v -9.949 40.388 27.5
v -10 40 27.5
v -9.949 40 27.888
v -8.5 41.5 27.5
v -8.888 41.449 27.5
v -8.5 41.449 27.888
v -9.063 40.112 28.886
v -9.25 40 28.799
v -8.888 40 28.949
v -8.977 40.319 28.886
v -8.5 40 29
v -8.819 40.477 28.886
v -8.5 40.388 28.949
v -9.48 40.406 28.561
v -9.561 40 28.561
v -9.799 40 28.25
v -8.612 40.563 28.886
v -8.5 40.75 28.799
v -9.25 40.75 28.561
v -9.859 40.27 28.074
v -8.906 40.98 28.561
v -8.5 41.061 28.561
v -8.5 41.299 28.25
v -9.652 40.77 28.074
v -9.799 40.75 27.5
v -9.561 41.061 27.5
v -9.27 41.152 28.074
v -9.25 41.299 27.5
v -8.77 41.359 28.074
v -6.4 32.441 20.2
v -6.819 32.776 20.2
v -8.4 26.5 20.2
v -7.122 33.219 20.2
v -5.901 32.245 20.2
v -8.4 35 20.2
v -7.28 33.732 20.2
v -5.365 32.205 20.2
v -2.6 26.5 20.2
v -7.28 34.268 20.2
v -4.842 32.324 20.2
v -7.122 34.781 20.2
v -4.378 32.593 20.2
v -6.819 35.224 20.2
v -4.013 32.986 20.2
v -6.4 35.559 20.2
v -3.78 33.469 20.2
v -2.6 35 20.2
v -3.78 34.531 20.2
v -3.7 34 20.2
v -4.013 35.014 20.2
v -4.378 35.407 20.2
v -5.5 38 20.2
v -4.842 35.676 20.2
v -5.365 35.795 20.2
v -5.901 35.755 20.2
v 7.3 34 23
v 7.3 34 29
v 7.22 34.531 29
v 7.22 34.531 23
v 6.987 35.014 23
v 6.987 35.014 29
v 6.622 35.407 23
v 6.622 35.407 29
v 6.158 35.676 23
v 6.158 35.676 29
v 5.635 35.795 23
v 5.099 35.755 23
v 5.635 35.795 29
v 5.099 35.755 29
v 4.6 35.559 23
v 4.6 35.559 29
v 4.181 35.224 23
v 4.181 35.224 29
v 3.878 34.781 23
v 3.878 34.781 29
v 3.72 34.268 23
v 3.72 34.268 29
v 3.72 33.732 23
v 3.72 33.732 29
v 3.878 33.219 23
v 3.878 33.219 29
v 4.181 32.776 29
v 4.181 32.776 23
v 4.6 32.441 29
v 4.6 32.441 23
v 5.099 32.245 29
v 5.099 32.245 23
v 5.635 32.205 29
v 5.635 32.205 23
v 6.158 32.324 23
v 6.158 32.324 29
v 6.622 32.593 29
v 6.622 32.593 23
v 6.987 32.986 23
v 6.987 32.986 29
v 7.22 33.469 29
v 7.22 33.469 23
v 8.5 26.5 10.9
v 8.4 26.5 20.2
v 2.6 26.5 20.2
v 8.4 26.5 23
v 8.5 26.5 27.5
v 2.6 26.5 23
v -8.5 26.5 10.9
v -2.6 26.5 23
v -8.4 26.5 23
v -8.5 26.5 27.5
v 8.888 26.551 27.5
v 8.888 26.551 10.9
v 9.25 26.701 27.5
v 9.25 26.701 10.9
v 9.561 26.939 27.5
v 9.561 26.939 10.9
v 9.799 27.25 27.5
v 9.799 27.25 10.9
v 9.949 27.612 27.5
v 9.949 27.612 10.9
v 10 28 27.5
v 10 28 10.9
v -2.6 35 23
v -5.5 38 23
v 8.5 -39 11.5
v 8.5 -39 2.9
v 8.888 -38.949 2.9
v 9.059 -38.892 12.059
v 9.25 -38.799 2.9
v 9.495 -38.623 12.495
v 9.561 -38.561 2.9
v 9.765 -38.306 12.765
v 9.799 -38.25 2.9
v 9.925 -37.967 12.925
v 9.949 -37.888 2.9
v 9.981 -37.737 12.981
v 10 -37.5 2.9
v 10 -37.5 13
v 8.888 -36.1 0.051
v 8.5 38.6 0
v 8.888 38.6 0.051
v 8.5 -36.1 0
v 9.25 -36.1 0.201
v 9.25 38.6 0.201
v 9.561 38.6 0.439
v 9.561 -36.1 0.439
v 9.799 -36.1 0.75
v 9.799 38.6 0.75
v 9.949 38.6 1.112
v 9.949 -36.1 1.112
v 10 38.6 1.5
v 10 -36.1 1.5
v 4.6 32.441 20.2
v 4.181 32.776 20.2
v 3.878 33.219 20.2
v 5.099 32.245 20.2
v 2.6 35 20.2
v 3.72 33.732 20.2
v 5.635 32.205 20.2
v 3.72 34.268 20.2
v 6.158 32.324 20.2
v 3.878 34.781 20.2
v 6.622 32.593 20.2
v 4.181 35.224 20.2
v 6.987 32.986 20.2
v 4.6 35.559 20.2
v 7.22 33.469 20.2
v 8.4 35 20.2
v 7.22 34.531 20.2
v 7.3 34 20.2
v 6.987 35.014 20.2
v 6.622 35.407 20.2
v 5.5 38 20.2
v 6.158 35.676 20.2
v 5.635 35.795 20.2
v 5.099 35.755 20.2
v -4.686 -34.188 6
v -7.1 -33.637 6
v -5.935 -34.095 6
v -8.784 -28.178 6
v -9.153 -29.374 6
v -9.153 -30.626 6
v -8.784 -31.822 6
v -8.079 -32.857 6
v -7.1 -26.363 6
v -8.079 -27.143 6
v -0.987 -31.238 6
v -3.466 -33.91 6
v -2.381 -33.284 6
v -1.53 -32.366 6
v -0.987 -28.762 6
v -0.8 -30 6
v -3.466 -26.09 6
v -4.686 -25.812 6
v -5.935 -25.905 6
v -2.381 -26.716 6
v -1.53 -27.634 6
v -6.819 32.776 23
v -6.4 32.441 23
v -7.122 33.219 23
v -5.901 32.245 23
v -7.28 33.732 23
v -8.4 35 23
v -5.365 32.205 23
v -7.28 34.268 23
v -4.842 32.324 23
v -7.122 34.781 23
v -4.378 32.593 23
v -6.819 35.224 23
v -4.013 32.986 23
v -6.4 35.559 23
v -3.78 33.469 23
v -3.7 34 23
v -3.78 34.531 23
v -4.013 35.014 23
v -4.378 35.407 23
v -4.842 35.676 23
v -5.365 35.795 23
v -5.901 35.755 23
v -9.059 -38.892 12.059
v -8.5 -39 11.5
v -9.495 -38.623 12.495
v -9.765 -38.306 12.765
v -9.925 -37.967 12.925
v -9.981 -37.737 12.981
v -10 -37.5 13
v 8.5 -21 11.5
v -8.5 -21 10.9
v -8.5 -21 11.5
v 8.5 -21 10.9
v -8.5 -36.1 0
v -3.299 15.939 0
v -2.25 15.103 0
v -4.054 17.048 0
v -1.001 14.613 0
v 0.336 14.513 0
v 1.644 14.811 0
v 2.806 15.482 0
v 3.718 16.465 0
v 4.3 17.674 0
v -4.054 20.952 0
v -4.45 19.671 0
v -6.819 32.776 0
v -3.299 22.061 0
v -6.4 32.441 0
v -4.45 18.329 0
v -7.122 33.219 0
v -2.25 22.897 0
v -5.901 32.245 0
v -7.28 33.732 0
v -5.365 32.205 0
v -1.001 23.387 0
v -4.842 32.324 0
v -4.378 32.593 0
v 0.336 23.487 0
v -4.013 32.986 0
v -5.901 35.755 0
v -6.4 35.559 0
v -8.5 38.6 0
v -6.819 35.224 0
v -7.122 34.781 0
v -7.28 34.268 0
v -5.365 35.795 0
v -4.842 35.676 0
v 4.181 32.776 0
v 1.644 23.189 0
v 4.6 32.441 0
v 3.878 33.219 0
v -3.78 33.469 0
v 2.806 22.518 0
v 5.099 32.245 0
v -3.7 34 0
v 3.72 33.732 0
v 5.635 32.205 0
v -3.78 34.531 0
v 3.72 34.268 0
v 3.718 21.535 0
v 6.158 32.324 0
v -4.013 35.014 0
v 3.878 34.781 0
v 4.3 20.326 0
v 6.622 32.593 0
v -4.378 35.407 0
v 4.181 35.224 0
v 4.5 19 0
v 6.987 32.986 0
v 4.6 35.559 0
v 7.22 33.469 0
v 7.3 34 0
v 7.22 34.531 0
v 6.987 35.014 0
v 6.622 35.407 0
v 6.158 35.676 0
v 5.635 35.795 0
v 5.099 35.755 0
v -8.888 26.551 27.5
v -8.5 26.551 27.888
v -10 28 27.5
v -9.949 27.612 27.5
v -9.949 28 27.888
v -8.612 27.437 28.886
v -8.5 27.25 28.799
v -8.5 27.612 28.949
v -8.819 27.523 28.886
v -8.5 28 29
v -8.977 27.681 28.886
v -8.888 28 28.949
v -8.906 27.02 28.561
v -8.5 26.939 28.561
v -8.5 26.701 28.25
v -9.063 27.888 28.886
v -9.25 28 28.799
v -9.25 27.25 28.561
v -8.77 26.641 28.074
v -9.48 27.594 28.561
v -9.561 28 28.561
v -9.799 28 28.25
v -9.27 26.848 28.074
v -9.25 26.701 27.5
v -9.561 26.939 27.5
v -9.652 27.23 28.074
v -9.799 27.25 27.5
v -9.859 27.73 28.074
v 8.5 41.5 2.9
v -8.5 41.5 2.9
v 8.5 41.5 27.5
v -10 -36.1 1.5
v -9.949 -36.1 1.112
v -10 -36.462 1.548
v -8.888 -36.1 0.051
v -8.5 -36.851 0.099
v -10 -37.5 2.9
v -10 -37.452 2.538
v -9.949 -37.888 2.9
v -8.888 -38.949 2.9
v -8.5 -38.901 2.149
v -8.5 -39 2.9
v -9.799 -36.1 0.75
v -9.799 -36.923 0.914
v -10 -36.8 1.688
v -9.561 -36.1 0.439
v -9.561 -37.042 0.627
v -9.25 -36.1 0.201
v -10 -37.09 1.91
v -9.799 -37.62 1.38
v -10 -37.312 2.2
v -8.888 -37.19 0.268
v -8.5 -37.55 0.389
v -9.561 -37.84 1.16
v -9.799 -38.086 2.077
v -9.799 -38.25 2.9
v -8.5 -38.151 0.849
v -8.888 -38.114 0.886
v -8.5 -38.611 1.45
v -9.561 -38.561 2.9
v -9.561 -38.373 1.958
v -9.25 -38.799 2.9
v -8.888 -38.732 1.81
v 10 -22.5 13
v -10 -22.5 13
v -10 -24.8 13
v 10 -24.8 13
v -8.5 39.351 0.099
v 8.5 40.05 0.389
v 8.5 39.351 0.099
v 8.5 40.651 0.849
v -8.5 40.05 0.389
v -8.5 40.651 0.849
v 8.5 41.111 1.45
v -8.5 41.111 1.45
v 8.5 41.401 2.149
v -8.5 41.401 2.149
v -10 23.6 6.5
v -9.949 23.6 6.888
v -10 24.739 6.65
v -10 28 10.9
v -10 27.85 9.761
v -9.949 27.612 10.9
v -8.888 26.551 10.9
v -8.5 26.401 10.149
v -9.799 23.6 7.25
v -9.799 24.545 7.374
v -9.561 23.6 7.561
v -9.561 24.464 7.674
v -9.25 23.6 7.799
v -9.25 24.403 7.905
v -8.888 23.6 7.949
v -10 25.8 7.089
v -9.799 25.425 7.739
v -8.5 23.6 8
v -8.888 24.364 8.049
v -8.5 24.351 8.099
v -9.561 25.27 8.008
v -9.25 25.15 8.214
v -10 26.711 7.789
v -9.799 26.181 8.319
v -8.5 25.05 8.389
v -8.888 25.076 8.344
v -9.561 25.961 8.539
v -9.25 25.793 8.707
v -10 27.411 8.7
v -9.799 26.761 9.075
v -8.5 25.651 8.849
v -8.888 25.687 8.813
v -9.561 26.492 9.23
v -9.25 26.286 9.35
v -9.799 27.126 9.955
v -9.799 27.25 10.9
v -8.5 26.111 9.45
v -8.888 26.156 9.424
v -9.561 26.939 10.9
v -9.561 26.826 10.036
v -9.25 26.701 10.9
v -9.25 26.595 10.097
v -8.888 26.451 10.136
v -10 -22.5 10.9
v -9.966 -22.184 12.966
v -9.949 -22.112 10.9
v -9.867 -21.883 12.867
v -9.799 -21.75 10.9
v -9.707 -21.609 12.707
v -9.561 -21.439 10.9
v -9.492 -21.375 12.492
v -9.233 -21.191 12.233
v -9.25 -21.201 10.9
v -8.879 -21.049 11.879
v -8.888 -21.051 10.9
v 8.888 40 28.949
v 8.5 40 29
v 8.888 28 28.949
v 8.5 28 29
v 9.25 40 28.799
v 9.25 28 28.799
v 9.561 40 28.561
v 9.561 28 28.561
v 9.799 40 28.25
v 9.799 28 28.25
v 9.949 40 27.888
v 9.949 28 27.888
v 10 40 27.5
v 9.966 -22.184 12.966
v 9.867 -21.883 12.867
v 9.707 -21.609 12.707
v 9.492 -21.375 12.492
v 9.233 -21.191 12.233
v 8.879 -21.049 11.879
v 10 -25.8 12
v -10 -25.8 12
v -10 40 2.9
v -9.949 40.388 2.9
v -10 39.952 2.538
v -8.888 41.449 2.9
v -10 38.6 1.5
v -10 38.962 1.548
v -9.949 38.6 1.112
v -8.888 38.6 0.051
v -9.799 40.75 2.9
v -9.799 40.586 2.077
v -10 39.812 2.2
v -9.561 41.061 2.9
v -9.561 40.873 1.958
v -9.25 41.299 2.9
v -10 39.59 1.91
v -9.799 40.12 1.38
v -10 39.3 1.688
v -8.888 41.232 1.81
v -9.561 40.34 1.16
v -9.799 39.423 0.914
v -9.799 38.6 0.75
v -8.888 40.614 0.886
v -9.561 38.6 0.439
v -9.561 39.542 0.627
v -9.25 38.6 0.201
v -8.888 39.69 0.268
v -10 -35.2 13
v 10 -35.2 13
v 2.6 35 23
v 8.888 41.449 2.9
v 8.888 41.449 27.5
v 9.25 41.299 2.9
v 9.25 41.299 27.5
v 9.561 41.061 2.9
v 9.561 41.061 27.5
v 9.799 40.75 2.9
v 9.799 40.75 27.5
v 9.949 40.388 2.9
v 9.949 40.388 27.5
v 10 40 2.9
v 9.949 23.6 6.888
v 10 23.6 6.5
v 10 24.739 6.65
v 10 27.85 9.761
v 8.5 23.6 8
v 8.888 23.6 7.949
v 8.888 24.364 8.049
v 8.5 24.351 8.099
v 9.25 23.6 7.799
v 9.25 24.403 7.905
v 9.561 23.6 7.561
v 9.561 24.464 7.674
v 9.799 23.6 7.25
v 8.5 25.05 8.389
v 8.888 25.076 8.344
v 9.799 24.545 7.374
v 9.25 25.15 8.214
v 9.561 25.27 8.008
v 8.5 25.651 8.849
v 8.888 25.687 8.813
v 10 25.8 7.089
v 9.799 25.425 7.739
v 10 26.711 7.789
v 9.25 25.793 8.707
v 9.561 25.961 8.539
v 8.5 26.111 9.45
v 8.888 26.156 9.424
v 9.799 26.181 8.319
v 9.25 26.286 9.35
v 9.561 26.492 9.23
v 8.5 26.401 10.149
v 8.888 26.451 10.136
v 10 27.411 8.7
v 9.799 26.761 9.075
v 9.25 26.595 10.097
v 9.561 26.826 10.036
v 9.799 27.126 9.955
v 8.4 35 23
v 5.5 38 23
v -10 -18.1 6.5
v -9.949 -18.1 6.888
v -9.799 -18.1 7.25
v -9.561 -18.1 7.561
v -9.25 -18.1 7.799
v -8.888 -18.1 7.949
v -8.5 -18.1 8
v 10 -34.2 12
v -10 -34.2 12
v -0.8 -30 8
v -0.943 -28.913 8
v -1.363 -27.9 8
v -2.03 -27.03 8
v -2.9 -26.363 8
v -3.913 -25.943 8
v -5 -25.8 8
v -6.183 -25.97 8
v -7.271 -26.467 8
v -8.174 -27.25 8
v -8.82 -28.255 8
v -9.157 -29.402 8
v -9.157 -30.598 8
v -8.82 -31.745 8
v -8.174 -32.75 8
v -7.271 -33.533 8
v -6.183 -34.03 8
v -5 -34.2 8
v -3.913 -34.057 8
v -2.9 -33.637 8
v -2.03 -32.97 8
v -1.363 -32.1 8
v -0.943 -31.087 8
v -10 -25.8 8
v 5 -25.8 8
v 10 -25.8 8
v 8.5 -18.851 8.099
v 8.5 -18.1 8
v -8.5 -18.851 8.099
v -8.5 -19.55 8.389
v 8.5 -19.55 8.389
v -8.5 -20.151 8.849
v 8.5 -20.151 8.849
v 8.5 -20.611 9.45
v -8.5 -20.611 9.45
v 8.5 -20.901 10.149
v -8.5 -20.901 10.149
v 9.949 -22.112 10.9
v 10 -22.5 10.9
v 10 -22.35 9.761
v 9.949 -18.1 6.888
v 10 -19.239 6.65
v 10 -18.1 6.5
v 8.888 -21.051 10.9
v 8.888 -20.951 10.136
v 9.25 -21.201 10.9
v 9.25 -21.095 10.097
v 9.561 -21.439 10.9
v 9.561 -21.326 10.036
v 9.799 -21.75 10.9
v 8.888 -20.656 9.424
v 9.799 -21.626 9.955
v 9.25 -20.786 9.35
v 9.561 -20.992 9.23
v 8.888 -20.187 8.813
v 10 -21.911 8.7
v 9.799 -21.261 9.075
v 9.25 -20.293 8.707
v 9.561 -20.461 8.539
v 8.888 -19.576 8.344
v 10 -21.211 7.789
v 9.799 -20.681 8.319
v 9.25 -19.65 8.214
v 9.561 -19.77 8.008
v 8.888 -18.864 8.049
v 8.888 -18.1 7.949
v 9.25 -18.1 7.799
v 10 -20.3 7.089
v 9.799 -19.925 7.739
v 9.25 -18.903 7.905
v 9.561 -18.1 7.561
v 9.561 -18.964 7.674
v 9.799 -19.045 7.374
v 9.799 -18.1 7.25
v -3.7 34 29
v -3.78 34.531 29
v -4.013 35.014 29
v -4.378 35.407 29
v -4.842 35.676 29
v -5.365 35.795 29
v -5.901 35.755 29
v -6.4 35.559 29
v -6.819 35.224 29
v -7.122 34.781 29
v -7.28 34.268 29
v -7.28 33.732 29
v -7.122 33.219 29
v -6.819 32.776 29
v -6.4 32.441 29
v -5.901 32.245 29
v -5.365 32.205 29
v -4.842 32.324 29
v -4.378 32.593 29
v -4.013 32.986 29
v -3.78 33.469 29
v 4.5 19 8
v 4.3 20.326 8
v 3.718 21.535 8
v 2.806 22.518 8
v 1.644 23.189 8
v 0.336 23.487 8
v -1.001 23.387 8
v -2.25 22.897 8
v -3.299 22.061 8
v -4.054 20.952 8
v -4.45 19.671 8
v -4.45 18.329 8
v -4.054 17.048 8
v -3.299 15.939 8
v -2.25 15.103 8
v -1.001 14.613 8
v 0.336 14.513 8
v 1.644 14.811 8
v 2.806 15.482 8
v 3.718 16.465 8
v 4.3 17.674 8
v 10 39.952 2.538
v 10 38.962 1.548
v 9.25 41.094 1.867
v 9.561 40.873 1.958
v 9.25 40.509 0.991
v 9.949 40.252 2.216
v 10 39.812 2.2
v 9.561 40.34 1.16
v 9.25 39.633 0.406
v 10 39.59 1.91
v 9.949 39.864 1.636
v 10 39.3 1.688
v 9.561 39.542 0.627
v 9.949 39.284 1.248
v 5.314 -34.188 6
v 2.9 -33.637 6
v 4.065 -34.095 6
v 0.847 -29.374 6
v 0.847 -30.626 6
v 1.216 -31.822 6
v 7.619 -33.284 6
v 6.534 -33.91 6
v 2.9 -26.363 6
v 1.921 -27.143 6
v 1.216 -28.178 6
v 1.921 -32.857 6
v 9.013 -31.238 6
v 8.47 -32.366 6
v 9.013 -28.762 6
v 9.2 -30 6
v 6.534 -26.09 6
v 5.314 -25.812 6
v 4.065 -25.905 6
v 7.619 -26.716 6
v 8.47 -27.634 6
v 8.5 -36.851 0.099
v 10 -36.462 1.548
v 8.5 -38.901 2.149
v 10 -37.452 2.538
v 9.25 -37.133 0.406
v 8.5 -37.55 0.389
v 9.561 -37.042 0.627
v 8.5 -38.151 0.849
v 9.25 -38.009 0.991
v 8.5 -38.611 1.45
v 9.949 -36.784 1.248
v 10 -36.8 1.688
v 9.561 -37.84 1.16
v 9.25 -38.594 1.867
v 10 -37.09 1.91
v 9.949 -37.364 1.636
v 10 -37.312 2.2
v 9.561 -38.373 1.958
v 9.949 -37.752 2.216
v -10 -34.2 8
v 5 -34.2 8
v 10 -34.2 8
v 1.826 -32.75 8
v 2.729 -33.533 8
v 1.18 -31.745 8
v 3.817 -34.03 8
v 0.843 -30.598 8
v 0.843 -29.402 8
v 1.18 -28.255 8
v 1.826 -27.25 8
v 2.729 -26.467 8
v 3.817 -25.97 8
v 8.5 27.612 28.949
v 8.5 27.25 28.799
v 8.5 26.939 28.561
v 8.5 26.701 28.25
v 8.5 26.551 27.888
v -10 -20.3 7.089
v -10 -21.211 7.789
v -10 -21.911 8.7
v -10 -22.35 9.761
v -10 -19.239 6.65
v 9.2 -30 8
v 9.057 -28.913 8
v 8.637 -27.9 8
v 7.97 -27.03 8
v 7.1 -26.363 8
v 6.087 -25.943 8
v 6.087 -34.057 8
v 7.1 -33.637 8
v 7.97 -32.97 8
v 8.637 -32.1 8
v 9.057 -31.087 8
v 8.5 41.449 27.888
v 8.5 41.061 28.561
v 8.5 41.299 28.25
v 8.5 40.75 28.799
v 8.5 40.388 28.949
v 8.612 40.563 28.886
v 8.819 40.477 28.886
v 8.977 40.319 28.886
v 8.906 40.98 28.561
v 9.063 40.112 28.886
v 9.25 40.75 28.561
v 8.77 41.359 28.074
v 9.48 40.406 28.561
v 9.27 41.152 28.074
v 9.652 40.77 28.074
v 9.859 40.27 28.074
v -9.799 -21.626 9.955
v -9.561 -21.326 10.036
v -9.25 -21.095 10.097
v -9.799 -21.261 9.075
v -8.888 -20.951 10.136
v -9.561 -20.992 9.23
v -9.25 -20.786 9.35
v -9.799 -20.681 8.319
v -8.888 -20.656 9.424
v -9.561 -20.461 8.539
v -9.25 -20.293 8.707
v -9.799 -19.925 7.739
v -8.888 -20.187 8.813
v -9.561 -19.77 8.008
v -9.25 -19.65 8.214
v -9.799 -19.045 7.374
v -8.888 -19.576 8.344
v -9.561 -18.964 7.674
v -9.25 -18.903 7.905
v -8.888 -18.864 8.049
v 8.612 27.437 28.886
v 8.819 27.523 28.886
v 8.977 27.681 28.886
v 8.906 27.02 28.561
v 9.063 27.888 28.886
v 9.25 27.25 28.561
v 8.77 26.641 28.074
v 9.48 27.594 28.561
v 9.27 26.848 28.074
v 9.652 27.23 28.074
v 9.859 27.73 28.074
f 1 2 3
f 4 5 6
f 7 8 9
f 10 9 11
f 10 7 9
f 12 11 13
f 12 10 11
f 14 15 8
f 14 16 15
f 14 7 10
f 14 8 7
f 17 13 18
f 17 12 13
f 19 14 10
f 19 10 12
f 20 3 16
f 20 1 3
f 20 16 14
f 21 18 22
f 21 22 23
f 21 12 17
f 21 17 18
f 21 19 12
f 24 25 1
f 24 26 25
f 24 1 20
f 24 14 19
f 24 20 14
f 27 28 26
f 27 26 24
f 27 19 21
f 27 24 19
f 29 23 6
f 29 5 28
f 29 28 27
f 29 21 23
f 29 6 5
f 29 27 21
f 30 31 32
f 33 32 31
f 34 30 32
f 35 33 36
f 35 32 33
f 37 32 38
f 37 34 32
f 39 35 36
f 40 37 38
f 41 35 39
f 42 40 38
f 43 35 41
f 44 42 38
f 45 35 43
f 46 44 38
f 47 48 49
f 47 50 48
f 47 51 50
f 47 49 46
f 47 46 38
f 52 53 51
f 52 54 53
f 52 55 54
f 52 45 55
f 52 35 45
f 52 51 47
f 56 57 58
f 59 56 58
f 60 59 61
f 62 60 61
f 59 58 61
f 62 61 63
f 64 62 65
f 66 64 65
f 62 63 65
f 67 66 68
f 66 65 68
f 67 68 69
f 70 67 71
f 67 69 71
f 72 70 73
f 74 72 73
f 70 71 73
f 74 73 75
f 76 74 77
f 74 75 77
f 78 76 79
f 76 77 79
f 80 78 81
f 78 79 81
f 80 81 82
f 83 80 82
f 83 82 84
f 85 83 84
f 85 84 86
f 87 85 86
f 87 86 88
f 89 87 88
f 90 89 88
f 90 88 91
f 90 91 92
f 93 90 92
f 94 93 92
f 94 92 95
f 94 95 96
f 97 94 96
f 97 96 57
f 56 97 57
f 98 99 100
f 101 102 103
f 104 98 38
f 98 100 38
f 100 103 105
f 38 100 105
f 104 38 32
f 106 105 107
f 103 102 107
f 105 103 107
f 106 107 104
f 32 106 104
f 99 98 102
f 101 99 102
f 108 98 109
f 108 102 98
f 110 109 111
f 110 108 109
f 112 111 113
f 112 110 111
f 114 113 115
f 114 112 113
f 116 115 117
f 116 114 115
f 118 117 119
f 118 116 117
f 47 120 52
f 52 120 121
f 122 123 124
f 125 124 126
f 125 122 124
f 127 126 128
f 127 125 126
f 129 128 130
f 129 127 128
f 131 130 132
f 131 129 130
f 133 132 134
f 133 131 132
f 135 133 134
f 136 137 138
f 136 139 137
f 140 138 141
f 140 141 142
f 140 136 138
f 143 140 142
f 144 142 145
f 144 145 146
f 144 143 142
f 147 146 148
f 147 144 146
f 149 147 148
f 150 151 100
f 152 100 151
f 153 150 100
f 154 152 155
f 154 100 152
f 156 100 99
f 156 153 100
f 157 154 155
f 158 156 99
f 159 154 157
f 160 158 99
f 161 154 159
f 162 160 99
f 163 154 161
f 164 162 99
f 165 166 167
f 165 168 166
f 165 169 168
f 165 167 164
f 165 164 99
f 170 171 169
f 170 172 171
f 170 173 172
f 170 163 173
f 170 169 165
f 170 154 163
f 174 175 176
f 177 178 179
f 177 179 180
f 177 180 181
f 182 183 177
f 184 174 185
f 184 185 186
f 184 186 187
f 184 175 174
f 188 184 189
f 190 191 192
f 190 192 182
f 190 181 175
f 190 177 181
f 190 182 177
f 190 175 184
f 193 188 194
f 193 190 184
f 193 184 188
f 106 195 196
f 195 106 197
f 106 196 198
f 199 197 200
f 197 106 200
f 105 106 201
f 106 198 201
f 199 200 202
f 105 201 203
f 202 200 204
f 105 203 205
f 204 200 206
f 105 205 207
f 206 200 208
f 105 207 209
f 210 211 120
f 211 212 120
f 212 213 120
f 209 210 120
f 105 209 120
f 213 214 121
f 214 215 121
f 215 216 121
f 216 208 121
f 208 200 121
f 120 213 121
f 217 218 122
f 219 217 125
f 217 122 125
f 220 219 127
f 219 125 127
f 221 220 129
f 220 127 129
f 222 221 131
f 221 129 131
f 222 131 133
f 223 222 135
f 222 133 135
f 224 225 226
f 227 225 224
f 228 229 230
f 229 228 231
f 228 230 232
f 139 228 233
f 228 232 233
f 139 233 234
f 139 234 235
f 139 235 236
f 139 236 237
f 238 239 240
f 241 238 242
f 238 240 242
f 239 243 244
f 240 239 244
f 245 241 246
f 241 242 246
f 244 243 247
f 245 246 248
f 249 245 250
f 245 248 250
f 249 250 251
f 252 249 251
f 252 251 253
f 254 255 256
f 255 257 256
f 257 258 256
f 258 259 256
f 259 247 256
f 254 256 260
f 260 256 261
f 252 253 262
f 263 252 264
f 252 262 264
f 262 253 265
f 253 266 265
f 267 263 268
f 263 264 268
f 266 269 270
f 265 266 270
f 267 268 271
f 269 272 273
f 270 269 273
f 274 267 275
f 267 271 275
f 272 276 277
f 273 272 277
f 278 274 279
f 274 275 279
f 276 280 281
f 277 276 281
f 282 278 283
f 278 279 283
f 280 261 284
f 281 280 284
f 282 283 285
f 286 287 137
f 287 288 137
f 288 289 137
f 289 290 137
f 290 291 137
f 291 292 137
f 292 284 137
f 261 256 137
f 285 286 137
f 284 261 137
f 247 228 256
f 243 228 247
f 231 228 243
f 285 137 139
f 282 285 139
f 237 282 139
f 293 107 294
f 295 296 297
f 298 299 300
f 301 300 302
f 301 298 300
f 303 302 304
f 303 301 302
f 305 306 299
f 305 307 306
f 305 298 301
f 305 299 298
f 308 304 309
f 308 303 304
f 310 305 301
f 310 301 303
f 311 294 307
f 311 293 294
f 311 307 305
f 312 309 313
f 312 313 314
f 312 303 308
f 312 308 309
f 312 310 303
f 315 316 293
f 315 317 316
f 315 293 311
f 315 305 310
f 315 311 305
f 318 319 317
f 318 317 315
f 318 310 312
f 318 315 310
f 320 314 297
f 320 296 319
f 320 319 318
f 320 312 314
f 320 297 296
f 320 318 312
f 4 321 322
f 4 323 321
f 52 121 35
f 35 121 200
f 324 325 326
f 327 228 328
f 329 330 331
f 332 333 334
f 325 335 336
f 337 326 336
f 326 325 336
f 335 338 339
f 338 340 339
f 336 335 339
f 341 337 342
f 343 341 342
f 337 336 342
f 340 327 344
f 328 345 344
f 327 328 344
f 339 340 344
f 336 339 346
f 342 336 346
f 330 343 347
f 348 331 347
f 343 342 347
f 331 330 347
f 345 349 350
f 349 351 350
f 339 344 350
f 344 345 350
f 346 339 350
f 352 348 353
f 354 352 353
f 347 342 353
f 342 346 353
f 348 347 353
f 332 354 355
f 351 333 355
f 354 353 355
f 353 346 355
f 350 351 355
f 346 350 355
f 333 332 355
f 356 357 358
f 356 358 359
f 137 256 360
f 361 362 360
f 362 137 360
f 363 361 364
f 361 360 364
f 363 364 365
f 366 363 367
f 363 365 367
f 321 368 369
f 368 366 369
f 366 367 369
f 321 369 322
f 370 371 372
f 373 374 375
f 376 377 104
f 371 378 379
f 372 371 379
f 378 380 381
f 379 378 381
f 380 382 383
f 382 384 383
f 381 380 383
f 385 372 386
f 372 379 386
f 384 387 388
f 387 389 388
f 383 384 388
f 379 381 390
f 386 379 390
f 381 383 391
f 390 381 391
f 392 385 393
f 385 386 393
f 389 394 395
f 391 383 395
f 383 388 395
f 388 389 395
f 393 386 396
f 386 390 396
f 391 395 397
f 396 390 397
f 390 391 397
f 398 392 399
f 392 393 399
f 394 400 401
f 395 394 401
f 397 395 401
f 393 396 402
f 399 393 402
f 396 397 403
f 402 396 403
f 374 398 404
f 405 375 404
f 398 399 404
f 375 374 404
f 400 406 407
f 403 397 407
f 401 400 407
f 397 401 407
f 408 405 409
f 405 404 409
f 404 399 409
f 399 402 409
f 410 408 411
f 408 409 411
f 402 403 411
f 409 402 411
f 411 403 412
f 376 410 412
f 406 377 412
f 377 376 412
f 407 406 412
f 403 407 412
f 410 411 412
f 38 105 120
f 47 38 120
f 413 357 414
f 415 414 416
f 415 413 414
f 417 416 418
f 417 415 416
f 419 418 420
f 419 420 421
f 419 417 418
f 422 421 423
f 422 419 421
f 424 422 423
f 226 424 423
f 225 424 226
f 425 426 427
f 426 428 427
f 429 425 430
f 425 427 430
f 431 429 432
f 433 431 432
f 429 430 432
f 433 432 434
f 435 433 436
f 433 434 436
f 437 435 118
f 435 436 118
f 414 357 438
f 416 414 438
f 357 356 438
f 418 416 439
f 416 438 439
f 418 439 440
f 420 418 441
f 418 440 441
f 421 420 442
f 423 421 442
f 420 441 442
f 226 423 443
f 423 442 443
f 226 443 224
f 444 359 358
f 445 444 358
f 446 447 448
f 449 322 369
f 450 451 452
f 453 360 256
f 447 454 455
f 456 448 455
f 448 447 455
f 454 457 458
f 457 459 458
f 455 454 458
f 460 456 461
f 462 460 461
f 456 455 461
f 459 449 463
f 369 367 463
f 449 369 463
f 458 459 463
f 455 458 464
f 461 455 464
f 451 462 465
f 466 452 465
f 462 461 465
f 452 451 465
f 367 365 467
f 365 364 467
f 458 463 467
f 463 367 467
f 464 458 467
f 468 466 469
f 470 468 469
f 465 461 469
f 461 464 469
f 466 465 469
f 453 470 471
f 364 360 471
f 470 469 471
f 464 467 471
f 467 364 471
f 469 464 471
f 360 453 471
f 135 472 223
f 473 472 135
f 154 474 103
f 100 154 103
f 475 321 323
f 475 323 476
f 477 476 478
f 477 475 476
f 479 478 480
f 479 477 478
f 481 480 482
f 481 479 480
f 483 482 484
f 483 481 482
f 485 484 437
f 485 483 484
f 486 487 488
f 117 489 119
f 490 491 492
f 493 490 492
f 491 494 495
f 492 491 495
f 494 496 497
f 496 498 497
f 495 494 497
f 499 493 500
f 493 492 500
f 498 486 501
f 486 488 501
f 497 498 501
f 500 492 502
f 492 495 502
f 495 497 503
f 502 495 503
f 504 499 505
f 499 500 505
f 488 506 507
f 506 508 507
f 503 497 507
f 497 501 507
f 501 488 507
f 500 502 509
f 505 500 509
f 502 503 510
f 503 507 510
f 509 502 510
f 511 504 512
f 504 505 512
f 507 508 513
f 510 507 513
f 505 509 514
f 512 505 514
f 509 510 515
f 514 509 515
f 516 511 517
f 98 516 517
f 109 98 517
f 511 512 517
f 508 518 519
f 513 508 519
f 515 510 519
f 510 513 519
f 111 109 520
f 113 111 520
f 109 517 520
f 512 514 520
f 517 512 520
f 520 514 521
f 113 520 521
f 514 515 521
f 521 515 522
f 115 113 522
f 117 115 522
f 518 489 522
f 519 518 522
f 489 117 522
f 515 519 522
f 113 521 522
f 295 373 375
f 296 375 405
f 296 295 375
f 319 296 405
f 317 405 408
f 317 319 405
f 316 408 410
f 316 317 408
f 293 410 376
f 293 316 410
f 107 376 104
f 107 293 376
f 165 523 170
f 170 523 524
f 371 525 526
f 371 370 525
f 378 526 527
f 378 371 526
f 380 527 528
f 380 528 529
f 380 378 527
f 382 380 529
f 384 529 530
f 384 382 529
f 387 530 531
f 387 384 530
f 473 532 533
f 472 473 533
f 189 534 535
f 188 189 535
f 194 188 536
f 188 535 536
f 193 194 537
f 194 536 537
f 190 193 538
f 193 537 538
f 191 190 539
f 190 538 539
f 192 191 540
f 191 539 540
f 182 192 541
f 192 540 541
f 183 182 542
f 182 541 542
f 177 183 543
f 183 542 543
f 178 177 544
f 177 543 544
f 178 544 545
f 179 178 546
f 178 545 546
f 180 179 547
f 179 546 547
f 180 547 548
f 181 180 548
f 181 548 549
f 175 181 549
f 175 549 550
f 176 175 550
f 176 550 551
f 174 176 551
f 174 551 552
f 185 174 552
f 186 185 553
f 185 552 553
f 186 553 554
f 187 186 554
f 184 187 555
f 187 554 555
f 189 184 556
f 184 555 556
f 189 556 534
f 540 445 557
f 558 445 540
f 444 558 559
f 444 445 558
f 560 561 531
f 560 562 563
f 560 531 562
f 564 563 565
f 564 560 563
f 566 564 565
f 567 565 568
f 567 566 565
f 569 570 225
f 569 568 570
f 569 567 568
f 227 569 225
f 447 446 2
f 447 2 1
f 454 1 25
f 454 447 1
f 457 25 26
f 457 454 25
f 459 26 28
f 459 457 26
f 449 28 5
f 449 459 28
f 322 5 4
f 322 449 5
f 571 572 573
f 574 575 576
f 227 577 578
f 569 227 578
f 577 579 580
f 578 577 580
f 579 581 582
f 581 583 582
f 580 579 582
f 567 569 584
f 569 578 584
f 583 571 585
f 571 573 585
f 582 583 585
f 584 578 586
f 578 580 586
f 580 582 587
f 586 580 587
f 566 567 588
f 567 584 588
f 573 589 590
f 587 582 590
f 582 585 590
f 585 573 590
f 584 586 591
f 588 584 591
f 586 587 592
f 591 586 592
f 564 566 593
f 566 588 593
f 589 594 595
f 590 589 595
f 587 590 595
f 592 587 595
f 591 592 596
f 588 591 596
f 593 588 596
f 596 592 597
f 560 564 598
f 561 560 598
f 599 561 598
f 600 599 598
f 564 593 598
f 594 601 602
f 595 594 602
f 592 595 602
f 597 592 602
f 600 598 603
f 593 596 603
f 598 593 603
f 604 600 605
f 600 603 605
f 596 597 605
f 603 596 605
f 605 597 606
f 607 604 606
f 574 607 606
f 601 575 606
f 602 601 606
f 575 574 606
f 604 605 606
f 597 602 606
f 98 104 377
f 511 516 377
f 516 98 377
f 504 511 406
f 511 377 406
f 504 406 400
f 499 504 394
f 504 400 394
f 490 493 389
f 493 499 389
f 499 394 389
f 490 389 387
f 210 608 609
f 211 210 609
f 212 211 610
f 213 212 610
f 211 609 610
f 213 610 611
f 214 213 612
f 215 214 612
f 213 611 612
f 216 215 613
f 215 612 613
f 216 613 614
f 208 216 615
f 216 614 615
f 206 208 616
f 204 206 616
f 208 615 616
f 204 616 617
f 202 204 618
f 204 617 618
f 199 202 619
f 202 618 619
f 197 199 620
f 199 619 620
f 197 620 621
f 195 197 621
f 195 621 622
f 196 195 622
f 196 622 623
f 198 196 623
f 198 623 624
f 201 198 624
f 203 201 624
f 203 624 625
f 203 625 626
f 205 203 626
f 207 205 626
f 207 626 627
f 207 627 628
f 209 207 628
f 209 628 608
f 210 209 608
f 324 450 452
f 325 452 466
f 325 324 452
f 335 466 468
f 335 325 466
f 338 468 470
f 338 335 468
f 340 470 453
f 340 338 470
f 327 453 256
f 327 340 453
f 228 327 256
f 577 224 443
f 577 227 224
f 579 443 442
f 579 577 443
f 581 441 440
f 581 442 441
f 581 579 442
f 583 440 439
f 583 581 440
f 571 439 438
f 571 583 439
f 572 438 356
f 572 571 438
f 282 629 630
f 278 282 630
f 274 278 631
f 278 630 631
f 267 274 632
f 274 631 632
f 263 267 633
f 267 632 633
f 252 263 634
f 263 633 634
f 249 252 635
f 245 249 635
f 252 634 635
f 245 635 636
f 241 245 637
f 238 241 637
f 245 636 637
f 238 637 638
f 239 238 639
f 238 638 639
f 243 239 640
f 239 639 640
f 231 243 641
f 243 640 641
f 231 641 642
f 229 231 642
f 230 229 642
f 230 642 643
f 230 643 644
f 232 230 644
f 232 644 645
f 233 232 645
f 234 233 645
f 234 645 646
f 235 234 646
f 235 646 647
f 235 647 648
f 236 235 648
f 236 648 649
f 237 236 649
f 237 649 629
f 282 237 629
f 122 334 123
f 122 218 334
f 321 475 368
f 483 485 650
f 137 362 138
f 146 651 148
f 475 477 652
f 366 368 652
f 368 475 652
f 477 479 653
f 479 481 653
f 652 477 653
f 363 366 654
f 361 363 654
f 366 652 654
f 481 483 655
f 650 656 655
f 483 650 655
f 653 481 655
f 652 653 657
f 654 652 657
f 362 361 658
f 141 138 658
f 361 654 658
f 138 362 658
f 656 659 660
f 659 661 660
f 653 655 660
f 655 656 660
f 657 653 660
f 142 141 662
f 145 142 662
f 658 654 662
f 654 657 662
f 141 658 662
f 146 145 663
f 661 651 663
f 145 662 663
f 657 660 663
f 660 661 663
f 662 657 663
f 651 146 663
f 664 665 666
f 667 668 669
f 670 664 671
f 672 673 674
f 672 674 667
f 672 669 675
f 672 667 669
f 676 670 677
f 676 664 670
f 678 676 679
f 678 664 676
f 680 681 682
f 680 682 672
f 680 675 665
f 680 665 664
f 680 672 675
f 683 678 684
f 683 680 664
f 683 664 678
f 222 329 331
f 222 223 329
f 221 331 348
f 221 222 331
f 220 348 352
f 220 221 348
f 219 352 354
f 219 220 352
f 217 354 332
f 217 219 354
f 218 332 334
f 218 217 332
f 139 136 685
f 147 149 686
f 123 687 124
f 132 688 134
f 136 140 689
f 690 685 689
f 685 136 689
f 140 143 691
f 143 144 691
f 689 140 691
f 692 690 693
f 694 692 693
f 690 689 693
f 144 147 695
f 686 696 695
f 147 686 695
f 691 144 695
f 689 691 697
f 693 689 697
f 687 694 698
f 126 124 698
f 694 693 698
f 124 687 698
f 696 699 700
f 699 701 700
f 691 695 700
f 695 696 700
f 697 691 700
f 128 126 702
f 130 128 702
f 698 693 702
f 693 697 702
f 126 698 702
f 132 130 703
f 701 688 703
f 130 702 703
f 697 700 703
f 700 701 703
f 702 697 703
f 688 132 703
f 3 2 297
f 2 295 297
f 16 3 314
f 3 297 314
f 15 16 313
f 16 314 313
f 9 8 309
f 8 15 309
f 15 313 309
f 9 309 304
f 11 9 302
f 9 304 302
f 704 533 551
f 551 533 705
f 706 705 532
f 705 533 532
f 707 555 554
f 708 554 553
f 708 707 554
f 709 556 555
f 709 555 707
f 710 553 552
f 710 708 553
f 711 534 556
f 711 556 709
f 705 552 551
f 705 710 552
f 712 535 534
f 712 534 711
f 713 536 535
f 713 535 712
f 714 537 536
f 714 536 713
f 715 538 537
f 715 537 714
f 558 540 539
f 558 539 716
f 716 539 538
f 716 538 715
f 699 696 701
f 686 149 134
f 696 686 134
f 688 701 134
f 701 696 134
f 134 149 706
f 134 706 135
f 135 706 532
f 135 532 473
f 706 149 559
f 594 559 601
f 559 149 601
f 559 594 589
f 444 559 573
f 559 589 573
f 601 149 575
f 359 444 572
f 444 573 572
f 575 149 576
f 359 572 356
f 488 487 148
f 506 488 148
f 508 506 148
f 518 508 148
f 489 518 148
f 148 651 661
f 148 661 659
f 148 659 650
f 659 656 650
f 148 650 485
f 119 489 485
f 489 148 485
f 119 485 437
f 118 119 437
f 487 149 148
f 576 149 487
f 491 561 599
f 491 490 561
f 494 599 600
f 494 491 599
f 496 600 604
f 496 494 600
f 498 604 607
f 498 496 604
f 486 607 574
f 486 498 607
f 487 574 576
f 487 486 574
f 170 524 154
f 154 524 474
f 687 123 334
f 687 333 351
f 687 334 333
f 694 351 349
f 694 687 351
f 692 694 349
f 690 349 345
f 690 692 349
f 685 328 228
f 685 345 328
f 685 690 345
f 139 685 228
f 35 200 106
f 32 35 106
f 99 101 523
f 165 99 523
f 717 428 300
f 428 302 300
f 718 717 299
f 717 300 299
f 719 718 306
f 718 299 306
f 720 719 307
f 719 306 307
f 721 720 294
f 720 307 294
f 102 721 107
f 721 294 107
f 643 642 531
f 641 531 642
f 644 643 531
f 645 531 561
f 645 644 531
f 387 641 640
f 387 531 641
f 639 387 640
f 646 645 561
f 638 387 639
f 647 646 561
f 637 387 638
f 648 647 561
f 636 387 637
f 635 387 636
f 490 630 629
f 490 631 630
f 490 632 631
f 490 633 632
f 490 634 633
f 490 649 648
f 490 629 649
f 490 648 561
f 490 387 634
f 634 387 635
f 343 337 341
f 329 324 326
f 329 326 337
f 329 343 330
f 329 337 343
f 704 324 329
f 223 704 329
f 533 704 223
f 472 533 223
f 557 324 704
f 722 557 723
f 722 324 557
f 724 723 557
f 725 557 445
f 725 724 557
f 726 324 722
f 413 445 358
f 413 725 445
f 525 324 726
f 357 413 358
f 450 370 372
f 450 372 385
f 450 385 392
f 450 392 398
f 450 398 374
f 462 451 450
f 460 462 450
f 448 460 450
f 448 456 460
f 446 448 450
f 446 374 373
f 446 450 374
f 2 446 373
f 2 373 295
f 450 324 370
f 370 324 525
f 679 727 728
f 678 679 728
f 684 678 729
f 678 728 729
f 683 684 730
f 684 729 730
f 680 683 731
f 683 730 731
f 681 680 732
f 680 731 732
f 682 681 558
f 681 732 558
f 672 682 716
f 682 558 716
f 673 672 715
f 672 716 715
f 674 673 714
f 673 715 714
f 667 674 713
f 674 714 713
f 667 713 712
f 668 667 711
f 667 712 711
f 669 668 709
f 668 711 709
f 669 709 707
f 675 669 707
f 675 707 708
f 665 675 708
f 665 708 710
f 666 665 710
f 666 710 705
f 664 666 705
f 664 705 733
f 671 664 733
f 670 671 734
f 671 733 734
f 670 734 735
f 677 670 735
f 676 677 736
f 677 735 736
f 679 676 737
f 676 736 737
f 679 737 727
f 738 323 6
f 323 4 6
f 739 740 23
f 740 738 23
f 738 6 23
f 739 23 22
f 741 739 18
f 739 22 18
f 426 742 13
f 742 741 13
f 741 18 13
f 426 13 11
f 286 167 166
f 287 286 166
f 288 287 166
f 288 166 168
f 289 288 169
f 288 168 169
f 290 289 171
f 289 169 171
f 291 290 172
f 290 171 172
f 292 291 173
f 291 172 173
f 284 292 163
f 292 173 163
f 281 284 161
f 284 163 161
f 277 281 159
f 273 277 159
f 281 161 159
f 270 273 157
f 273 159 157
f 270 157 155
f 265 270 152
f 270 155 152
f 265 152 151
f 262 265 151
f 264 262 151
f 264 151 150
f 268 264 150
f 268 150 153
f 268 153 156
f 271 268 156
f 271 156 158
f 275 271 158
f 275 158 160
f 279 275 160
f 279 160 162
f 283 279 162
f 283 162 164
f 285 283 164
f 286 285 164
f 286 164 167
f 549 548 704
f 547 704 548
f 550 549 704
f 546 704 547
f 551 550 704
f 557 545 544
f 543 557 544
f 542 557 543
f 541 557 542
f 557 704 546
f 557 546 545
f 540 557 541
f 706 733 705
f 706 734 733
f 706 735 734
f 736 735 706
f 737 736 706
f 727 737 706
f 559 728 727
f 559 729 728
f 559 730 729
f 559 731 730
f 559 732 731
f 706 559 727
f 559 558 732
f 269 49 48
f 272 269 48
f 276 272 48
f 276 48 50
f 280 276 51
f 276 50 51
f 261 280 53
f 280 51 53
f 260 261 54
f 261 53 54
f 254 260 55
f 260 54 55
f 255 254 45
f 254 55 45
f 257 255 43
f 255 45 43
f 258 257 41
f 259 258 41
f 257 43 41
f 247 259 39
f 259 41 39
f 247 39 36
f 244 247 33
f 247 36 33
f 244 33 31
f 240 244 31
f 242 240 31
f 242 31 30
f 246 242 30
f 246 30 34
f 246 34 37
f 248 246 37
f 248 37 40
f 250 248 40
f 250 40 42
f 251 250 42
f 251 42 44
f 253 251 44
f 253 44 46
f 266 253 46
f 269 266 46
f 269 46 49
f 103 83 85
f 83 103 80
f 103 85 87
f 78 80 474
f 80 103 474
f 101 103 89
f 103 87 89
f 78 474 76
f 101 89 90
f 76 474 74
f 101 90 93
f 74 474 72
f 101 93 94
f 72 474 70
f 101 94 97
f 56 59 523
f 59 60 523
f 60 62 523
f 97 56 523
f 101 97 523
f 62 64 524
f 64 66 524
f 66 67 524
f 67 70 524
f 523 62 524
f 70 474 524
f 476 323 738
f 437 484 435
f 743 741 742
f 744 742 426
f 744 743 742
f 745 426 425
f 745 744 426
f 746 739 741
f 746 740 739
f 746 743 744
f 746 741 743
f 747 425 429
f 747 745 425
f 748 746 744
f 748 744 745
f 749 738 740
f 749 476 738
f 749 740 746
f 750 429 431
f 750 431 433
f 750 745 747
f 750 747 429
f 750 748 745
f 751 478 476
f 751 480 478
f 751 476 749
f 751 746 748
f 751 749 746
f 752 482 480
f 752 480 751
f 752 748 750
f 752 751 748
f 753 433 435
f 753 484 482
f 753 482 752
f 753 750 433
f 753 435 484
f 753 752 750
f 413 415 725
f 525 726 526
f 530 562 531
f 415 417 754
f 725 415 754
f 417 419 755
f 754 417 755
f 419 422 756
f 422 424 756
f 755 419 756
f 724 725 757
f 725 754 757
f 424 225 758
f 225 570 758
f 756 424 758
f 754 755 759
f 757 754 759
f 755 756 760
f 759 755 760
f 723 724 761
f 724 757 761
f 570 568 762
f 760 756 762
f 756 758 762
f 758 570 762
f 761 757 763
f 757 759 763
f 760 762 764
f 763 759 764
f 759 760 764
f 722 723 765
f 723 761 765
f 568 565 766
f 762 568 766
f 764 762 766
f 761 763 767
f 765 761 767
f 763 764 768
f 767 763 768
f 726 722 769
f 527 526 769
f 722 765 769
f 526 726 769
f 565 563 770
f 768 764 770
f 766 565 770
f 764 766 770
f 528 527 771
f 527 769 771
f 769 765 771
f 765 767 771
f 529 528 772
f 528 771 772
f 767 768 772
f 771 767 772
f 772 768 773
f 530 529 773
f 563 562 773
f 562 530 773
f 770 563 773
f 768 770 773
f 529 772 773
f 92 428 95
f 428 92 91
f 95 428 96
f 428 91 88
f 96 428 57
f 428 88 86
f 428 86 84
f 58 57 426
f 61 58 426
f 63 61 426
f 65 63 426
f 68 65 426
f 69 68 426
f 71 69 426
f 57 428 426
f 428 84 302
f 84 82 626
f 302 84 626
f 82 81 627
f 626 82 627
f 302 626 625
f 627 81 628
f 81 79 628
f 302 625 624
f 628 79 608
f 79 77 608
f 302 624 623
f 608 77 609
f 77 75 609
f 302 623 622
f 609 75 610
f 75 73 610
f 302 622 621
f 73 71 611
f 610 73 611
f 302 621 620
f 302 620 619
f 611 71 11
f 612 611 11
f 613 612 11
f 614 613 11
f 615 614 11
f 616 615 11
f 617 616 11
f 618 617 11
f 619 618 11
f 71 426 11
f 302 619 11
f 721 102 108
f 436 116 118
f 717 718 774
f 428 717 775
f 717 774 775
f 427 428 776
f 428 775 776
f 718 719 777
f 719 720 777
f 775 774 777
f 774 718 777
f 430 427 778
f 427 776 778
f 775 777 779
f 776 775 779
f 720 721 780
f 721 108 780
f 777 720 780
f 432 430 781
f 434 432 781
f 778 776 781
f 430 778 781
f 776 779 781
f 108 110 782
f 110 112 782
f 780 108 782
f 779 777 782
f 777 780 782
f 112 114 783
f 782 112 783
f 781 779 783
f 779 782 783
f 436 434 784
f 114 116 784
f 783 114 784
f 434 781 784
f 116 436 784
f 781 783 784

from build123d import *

# Parameters (mm, degrees)
PAD003_DEPTH    = 2.8
SKETCH_W        = 20
SKETCH_H        = 68
PAD_DEPTH       = 8
SKETCH276_W     = 20
SKETCH276_H     = 5
PAD001_DEPTH    = 5
SKETCH342_W     = 20
SKETCH342_H     = 29
PAD002_DEPTH    = 7.5
SKETCH343_R     = 1.8
POCKET_DEPTH    = 29.001
SKETCH347_W     = 20
SKETCH347_H     = 13
PAD004_DEPTH    = 5
SKETCH348_W     = 20
SKETCH348_H     = 8.4
POCKET001_DEPTH = 5
SKETCH345_R     = 4.2
POCKET002_DEPTH = 7
SKETCH346_R     = 4.5
POCKET003_DEPTH = 8.001
CHAMFER_SIZE    = 1
FILLET_R        = 2.9
FILLET001_R     = 1.5


with BuildPart() as pad003:
    # Sketch344 → Pad003 (new body)
    with BuildSketch(Plane.XY.offset(23)):
        Polygon((-8.4, 25), (-2.6, 25), (-2.6, 35), (-5.5, 38), (-8.4, 35), align=None)
        Polygon((2.6, 25), (8.4, 25), (8.4, 35), (5.5, 38), (2.6, 35), align=None)
    extrude(amount=-PAD003_DEPTH)


with BuildPart() as fillet001:
    # Sketch → Pad (new body)
    with BuildSketch(Plane.XY):
        Rectangle(SKETCH_W, SKETCH_H)
    extrude(amount=PAD_DEPTH)

    # Sketch276 → Pad001 (new body)
    with BuildSketch(Plane.XY.offset(8)):
        with Locations((0, -23.5)):
            Rectangle(SKETCH276_W, SKETCH276_H)
    extrude(amount=PAD001_DEPTH)

    # Sketch342 → Pad002 (new body, symmetric)
    with BuildSketch(Plane(origin=(0, 34, 0), x_dir=(-1, 0, 0), z_dir=(0, 1, 0))):
        with Locations((0, 14.5)):
            Rectangle(SKETCH342_W, SKETCH342_H)
    extrude(amount=PAD002_DEPTH, both=True)

    # Sketch343 → Pocket (cut, through all)
    with BuildSketch(Plane.XY.offset(29)):
        with Locations((-5.5, 34)):
            Circle(SKETCH343_R)
        with Locations((5.5, 34)):
            Circle(SKETCH343_R)
    extrude(amount=-POCKET_DEPTH, mode=Mode.SUBTRACT)

    # Cut: cut Pad003
    add(pad003.part, mode=Mode.SUBTRACT)

    # Sketch347 → Pad004 (new body)
    with BuildSketch(Plane.XZ.offset(34)):
        with Locations((0, 6.5)):
            Rectangle(SKETCH347_W, SKETCH347_H)
    extrude(amount=PAD004_DEPTH)

    # Sketch348 → Pocket001 (cut)
    with BuildSketch(Plane.XY.offset(13)):
        with Locations((0, -30)):
            Rectangle(SKETCH348_W, SKETCH348_H)
    extrude(amount=-POCKET001_DEPTH, mode=Mode.SUBTRACT)

    # Sketch345 → Pocket002 (cut)
    with BuildSketch(Plane.XY.offset(13)):
        with Locations((-5, -30)):
            Circle(SKETCH345_R)
        with Locations((5, -30)):
            Circle(SKETCH345_R)
    extrude(amount=-POCKET002_DEPTH, mode=Mode.SUBTRACT)

    # Sketch346 → Pocket003 (cut, through all)
    with BuildSketch(Plane.XY.offset(8)):
        with Locations((0, 19)):
            Circle(SKETCH346_R)
    extrude(amount=-POCKET003_DEPTH, mode=Mode.SUBTRACT)

    # Chamfer
    chamfer_edges = [fillet001.edges().sort_by_distance(p)[0] for p in [
        (0, -25.8, 13),
        (0, -34.2, 13),
    ]]
    chamfer(chamfer_edges, length=CHAMFER_SIZE)

    # Fillet
    fillet_edges = [fillet001.edges().sort_by_distance(p)[0] for p in [
        (0, 26.5, 8),
        (0, 41.5, 0),
        (0, -39, 0),
        (0, -21, 8),
    ]]
    fillet(fillet_edges, radius=FILLET_R)

    # Fillet001
    fillet001_edges = [fillet001.edges().sort_by_distance(p)[0] for p in [
        (0, -39, 13),
        (-10, -39, 7.95),
        (10, -39, 7.95),
        (0, -21, 13),
        (-10, 1.25, 0),
        (-10, 41.5, 15.95),
        (-10, 26.5, 19.95),
        (-10, 2.75, 8),
        (10, 2.75, 8),
        (0, 26.5, 29),
        (-10, 34, 29),
        (0, 41.5, 29),
        (10, 41.5, 15.95),
        (10, 34, 29),
        (10, 1.25, 0),
    ]]
    fillet(fillet001_edges, radius=FILLET001_R)


solid = fillet001.part
